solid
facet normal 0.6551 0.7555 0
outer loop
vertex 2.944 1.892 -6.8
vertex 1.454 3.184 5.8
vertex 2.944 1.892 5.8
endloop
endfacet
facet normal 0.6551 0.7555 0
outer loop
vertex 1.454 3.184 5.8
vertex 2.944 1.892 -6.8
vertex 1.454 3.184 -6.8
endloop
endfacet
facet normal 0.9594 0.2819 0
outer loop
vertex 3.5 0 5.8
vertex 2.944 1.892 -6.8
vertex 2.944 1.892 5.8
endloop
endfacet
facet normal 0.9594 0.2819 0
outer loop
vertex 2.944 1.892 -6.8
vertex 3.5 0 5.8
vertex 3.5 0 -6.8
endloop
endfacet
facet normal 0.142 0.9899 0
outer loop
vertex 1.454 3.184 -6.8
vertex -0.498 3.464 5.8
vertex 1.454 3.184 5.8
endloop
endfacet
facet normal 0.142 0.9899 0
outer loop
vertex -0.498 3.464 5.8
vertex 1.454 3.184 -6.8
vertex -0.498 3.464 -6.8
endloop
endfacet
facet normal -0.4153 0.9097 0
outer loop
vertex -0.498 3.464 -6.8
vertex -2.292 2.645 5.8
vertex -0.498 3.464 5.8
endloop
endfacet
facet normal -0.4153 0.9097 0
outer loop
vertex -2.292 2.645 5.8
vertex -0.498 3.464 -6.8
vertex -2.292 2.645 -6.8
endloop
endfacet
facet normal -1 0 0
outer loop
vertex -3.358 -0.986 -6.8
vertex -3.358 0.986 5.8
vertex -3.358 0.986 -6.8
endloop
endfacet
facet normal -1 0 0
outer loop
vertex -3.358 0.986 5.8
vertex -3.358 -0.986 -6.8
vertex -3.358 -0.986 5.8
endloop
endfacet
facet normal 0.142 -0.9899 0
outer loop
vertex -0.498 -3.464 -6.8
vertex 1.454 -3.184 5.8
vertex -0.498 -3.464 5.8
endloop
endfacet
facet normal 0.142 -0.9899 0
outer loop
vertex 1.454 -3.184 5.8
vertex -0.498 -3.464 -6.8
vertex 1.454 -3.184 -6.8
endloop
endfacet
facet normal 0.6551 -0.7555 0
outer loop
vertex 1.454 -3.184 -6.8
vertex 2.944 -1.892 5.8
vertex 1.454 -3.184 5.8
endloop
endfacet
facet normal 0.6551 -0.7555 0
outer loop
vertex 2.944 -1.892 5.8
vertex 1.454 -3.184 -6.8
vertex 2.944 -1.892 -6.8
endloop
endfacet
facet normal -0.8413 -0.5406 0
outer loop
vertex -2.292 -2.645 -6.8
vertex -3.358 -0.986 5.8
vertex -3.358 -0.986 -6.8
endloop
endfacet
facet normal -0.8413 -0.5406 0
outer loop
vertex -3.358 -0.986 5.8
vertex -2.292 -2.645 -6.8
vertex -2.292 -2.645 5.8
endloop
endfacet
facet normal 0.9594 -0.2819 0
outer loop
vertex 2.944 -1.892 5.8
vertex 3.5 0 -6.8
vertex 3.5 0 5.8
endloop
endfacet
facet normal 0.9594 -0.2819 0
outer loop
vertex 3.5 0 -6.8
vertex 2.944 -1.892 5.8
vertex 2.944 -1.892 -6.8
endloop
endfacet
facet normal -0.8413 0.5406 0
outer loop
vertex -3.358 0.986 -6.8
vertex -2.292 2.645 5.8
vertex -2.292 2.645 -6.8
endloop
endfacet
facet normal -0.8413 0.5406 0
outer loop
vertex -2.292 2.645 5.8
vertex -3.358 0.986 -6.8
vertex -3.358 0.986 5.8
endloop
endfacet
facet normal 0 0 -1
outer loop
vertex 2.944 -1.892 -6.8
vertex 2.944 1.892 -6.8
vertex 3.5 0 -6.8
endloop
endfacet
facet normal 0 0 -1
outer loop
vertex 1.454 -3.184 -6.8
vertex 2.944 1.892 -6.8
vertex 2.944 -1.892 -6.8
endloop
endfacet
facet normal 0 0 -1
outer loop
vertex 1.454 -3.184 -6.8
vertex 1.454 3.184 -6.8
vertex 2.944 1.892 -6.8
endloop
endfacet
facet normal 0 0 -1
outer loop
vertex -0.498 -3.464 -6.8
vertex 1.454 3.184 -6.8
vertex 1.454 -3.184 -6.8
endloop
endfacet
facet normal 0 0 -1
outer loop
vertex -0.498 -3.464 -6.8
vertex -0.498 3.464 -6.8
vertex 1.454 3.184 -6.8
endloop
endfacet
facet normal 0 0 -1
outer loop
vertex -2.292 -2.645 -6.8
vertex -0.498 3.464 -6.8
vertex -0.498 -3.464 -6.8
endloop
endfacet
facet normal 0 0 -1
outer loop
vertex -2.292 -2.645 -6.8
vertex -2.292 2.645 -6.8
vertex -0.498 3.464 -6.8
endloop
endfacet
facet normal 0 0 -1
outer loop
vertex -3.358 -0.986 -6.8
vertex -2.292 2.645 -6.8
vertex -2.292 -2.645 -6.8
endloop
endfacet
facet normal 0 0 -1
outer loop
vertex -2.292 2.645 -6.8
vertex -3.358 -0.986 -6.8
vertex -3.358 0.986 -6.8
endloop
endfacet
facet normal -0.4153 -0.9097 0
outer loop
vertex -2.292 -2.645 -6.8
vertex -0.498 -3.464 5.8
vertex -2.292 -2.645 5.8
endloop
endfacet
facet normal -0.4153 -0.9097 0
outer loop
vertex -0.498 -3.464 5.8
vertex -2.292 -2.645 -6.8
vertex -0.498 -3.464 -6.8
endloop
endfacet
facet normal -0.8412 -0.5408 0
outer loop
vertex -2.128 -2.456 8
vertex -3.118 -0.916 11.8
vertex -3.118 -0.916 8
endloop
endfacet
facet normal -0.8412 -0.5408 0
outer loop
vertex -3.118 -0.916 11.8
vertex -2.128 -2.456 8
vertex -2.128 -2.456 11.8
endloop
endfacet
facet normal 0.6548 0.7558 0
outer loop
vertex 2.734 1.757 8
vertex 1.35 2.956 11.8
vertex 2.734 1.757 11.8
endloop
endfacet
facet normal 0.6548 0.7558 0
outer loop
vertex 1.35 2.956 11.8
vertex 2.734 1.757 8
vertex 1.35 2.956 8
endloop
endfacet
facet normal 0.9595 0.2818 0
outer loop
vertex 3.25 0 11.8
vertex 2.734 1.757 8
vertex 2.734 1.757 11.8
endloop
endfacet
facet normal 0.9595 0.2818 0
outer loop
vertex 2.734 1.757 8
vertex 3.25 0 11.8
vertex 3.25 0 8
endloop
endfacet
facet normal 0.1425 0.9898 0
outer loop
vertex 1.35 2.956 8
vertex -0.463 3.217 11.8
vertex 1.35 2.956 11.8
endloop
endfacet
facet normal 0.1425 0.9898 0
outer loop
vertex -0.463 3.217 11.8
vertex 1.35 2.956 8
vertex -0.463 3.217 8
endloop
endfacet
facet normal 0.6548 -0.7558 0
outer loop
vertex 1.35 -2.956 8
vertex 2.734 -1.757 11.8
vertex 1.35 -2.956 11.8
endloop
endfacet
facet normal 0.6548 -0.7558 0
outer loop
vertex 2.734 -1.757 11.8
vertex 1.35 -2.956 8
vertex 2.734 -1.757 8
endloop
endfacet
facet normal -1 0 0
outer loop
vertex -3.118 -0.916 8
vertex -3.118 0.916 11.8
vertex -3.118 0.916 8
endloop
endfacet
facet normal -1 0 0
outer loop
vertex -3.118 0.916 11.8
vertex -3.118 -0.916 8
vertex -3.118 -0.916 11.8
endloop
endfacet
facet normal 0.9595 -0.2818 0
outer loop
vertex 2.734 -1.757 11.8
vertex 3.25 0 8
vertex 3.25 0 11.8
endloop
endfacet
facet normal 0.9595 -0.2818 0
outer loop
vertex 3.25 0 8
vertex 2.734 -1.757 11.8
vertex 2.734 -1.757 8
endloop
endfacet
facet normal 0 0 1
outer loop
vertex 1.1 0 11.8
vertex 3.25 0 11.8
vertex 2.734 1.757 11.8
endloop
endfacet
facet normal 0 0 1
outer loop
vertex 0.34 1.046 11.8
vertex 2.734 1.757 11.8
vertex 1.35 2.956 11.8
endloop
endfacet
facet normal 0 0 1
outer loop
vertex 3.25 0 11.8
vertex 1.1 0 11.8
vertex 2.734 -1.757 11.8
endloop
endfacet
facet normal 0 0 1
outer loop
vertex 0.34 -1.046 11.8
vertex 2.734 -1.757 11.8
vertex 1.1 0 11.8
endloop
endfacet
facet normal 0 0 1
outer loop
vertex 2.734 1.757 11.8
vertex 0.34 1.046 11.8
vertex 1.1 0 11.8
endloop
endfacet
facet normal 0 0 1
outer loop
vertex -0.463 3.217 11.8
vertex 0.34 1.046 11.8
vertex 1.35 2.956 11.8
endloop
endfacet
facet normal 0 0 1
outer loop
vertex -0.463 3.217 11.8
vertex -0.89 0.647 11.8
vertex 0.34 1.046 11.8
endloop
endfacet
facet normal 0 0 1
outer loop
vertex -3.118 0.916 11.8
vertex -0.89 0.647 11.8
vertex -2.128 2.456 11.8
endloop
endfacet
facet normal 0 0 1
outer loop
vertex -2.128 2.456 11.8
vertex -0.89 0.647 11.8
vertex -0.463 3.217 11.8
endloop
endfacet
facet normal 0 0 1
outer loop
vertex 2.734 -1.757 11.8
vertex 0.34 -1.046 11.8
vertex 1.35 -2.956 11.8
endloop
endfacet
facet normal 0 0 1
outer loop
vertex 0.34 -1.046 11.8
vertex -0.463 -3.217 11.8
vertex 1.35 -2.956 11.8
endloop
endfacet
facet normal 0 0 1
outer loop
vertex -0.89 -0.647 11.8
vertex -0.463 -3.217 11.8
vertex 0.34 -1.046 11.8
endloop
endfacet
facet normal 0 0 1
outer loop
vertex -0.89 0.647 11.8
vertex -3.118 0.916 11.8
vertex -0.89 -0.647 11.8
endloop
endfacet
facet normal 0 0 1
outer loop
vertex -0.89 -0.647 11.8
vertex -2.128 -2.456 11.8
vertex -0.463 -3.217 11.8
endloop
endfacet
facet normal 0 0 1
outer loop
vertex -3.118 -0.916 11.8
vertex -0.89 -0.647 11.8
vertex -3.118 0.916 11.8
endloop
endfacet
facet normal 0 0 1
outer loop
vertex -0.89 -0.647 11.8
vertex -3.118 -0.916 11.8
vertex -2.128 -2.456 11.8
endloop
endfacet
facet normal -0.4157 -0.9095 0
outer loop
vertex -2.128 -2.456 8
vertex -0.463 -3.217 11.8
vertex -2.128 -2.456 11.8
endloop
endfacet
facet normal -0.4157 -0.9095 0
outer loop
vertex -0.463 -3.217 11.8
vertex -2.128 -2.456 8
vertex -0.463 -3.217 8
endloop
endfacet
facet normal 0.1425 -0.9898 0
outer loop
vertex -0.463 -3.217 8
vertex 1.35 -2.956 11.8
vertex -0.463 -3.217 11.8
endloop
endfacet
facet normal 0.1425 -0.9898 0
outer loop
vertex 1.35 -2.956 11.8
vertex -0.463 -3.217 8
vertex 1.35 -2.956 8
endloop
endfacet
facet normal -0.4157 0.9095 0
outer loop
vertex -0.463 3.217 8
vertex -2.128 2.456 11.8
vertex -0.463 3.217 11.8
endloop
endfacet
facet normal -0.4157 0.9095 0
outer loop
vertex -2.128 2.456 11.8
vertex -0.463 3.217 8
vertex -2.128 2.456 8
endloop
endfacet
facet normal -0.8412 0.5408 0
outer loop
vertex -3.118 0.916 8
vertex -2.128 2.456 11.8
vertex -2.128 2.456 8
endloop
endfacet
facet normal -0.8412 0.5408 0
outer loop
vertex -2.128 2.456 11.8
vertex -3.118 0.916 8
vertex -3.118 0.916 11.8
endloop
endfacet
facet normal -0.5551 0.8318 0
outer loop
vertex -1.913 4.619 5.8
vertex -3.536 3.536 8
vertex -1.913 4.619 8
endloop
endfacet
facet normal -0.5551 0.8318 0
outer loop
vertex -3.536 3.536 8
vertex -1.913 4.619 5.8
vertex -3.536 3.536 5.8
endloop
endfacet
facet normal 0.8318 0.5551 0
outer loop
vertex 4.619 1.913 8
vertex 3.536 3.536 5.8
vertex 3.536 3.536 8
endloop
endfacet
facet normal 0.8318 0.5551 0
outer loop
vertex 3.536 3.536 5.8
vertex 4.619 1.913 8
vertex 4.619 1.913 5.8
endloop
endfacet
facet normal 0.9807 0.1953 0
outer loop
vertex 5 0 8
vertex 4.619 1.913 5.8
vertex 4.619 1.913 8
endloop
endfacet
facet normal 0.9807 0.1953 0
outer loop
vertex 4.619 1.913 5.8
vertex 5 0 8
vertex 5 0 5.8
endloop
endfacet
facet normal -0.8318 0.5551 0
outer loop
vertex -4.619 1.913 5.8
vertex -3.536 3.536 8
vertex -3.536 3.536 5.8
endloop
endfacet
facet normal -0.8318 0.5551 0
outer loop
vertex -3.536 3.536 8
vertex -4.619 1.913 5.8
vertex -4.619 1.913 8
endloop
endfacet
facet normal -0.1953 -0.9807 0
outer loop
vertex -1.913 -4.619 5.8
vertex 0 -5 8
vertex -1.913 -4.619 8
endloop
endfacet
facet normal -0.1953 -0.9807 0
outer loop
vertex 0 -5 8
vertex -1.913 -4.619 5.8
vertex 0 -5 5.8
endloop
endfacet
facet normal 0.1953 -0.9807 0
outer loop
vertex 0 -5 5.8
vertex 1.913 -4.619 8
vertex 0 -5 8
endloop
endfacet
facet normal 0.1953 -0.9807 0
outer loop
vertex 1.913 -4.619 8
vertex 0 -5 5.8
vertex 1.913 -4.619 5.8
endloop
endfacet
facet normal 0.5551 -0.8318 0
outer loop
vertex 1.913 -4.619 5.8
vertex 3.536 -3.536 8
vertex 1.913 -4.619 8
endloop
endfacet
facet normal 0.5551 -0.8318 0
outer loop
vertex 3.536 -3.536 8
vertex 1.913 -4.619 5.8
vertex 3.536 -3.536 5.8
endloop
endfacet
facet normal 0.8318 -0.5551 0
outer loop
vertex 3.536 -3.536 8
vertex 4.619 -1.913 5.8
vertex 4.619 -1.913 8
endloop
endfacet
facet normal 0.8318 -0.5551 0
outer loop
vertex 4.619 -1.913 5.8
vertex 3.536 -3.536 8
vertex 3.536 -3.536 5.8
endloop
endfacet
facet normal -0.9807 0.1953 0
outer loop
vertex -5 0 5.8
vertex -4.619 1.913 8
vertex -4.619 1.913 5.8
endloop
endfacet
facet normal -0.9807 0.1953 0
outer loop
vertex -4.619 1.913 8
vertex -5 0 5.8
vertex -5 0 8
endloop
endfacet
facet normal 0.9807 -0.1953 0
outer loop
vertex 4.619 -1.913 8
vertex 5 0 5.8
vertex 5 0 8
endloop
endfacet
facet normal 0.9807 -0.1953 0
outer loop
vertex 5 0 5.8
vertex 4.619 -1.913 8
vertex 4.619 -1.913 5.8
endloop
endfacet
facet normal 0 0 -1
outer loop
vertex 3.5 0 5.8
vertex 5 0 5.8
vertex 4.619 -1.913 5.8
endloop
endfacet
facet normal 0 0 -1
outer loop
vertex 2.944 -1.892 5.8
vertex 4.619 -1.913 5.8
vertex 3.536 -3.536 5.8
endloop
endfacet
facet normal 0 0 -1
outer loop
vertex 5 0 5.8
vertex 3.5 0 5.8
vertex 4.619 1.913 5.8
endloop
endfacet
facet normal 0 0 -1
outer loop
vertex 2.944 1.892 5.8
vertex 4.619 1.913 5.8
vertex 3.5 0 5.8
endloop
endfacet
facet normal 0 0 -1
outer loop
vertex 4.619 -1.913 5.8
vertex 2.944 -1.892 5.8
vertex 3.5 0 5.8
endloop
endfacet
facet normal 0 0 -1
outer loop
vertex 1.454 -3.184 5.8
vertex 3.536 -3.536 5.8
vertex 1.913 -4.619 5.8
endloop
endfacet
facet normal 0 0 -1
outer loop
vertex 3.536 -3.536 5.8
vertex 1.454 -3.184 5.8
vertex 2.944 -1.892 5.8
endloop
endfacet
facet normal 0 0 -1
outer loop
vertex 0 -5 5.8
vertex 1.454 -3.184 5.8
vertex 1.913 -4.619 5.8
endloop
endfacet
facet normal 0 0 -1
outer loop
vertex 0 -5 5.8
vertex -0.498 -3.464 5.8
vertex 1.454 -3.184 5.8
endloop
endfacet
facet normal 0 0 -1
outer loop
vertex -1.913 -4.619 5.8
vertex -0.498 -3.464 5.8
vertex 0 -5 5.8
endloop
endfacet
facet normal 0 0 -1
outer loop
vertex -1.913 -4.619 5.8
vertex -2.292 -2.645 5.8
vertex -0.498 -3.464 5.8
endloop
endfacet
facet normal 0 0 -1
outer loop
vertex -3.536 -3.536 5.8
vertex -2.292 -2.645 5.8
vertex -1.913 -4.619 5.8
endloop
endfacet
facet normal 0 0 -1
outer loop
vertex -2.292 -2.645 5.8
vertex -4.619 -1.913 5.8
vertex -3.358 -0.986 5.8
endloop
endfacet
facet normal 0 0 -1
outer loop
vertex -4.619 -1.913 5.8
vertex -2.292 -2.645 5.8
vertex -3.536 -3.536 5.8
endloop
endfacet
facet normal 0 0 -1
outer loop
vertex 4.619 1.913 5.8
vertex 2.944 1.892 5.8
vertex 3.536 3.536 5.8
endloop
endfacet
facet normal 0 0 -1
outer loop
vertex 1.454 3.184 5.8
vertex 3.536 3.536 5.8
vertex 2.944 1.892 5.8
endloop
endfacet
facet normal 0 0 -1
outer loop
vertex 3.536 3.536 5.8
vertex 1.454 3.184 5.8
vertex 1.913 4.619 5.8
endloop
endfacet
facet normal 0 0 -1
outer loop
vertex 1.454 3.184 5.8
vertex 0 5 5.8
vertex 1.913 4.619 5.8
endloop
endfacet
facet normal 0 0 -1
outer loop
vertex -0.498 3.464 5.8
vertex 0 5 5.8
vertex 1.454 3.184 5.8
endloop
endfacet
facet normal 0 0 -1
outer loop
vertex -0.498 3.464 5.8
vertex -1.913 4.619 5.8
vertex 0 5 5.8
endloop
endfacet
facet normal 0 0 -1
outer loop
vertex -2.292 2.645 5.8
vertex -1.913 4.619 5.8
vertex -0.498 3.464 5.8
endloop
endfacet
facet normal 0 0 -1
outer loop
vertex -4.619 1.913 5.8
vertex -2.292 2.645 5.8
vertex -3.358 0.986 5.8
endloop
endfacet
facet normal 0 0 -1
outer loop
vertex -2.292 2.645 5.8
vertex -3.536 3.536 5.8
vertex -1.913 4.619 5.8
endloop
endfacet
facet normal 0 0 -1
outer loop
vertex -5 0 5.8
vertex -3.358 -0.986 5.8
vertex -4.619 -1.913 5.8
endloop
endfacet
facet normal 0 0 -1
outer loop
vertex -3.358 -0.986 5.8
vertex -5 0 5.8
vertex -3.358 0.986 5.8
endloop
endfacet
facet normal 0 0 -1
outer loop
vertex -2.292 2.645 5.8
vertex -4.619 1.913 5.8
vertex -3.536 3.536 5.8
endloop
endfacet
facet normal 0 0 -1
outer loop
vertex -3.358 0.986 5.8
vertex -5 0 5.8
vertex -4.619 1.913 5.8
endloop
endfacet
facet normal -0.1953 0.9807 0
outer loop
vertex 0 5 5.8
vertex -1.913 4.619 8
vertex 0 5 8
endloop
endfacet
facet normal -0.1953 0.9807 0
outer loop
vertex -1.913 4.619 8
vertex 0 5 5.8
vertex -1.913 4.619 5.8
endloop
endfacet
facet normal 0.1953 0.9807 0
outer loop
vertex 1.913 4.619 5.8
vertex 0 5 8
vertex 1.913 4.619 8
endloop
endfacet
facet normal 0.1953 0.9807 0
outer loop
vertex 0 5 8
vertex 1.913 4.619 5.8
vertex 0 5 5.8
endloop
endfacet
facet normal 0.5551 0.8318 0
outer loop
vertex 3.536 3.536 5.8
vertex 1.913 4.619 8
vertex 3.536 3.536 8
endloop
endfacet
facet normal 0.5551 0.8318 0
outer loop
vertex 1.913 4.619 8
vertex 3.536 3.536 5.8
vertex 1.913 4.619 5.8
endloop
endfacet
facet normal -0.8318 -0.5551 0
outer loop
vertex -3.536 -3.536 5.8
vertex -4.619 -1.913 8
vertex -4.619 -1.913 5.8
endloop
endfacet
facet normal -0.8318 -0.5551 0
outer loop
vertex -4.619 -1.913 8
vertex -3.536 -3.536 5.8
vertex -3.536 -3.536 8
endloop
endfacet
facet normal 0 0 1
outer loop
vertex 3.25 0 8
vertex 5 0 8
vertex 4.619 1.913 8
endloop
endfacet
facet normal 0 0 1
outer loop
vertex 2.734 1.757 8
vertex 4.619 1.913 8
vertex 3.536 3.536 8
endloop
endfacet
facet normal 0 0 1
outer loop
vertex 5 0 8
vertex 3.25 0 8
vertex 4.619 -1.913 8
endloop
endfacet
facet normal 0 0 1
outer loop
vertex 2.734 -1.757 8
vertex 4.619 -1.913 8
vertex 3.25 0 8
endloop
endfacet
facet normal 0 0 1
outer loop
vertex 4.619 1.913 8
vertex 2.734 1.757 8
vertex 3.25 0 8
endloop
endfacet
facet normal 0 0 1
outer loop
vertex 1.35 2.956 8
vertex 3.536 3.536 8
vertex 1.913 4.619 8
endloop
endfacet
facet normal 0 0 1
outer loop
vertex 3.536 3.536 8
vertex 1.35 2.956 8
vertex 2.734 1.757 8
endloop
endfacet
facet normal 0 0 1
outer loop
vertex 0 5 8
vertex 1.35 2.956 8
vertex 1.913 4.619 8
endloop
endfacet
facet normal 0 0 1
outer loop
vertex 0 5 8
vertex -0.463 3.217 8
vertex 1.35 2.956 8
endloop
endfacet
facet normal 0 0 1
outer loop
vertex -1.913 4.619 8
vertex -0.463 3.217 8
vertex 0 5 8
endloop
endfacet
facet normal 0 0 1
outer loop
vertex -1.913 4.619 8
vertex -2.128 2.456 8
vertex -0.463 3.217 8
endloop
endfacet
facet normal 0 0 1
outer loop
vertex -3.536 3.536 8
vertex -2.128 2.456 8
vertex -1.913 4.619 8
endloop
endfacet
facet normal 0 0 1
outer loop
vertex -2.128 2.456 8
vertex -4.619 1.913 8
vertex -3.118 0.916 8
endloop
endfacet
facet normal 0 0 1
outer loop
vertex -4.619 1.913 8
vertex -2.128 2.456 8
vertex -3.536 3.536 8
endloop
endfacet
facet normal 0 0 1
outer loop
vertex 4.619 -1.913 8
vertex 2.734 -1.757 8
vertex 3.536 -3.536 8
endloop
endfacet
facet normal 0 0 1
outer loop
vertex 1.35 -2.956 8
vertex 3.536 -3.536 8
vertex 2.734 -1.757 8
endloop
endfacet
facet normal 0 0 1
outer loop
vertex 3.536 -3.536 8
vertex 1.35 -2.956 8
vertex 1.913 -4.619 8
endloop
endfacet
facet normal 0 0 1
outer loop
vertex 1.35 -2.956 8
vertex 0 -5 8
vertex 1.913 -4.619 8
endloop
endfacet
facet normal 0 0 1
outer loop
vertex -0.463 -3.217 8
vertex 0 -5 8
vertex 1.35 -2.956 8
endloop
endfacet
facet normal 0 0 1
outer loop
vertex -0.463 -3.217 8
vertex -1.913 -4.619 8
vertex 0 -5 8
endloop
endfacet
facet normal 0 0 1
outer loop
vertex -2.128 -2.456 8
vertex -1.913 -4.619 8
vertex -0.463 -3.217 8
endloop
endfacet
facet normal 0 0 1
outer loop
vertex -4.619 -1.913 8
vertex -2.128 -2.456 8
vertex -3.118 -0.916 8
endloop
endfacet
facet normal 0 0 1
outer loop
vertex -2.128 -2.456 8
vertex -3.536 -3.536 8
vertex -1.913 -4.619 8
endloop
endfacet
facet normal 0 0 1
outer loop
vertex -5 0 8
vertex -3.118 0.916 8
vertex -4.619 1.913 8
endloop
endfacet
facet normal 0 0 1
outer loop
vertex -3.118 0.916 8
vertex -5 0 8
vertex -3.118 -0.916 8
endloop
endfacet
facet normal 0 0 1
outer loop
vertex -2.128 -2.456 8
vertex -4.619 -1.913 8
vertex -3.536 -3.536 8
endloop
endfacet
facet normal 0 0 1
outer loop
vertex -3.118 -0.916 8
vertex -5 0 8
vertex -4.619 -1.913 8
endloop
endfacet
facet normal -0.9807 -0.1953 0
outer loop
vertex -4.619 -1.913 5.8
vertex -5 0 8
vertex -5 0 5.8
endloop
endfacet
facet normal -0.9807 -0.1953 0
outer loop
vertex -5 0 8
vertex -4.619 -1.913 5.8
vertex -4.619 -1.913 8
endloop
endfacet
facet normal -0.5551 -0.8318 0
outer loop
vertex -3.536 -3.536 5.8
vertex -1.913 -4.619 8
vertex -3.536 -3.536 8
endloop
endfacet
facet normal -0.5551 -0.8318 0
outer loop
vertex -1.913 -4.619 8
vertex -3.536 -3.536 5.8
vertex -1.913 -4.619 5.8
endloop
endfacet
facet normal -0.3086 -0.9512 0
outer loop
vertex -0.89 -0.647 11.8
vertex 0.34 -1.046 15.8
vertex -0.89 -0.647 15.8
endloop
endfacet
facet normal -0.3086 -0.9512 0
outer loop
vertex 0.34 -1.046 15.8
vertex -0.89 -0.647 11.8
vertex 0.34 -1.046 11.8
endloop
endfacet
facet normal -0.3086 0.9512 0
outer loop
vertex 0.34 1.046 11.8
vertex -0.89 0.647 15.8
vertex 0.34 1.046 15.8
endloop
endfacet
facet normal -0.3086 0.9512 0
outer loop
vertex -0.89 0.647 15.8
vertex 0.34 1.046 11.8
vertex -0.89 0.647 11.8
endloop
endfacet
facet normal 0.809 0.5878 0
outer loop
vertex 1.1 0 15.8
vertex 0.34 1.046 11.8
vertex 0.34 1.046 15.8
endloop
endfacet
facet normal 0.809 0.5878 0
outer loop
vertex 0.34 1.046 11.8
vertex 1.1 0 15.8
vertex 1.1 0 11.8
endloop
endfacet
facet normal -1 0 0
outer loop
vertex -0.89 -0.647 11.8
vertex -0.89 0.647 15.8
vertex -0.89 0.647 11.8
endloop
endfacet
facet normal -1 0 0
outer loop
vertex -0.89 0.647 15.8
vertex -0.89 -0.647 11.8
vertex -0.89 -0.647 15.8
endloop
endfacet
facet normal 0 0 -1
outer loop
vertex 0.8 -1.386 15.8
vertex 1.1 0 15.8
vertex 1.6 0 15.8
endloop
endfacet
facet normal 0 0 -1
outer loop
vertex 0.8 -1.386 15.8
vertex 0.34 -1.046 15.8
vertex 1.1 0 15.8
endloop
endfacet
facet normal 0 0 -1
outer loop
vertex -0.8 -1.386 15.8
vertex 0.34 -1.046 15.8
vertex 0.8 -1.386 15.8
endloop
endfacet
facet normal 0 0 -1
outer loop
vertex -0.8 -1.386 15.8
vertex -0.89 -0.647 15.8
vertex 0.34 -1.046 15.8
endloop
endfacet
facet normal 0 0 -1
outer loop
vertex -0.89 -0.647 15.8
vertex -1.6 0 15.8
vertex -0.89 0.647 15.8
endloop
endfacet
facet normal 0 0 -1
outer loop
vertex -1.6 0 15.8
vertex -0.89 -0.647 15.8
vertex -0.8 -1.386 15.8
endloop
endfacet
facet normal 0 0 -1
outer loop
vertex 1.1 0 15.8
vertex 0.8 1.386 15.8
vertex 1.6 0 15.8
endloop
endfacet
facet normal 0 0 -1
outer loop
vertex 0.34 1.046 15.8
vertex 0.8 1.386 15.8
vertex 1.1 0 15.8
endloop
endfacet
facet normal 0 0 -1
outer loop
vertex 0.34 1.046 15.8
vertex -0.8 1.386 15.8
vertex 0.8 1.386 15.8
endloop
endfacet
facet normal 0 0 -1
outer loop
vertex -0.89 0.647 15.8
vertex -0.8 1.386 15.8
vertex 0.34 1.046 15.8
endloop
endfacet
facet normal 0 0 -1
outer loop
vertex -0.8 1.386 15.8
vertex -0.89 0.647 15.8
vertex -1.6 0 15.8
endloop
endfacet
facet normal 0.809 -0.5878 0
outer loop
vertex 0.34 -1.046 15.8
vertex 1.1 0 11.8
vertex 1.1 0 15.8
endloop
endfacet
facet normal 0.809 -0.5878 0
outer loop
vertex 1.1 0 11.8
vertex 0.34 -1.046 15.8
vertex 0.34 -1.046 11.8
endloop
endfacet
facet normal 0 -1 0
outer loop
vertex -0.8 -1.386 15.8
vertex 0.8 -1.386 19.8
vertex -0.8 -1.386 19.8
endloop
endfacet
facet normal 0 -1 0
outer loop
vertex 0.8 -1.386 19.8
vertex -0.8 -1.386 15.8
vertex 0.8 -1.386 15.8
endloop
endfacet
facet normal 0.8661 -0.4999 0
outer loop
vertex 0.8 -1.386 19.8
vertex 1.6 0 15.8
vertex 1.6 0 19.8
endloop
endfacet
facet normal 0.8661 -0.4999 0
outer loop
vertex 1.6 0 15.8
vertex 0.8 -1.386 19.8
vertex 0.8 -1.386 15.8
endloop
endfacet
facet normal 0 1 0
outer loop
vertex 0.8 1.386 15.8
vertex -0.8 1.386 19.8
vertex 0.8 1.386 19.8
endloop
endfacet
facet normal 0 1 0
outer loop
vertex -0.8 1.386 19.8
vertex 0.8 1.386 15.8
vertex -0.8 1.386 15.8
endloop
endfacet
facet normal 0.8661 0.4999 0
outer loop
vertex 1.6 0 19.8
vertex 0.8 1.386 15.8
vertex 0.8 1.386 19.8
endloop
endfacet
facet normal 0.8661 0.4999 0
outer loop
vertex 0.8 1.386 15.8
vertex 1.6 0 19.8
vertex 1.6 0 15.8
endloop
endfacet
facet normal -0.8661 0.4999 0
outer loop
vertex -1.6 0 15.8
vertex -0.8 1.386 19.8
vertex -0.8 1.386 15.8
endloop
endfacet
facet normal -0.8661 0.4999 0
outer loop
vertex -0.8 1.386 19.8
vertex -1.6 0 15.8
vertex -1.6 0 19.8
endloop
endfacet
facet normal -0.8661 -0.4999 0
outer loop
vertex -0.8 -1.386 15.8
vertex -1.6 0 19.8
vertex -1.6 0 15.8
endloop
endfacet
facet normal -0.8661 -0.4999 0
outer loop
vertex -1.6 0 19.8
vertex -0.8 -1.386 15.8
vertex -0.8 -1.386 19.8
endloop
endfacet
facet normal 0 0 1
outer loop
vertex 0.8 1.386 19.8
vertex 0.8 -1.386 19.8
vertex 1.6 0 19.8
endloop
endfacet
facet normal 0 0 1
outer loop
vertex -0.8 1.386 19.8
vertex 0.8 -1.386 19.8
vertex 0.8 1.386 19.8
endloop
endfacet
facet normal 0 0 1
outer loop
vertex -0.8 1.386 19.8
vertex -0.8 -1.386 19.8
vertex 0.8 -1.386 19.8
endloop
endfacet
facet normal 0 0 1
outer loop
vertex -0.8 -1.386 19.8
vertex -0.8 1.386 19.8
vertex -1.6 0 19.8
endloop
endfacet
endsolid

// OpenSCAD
// Parameters
body_diameter_mm = 7; //[3.5:14:0.1]
overall_height_mm = 13.6; //[6.8:27.2:0.1]
body_height_mm = 13.6; //[6.8:27.2:0.1]
lever_length_mm = 10; //[5:20:0.1]
lever_diameter_mm = 2.2; //[1:5:0.1]
thread_outer_diameter_mm = 6.5; //[3.25:13:0.1]
thread_length_mm = 6; //[3:12:0.1]
panel_thickness_mm = 3; //[1:8:0.1]
mounting_hardware_included = 1; //[0:1:1]
overlap_mm = 1; //[0.5:2:0.1]
toggle_tip_diameter_mm = 3.2; //[1.6:6.4:0.1]
toggle_tip_height_mm = 4; //[2:8:0.1]
nut_seat_outer_diameter_mm = 10; //[5:20:0.1]
nut_seat_height_mm = 2.2; //[1:5:0.1]

// Toggle switch - complete geometry
module toggle() {
  union() {
    // Cylindrical body
    color("DimGray") {
      translate([0, 0, 0])
        cylinder(r=body_diameter_mm/2, h=body_height_mm, center=true);
    }
    
    // Panel mount thread or collar
    color("Silver") {
      translate([0, 0, body_height_mm/2 + thread_length_mm/2 - overlap_mm])
        cylinder(r=thread_outer_diameter_mm/2, h=thread_length_mm, center=true);
    }
    
    // Mounting nut and washer seat
    if (mounting_hardware_included) {
      color("Silver") {
        translate([0, 0, body_height_mm/2 + nut_seat_height_mm/2 - overlap_mm])
          cylinder(r=nut_seat_outer_diameter_mm/2, h=nut_seat_height_mm, center=true);
      }
    }
    
    // Actuator lever
    color("Black") {
      translate([0, 0, body_height_mm/2 + lever_length_mm/2 - overlap_mm])
        cylinder(r=lever_diameter_mm/2, h=lever_length_mm, center=true);
    }
    
    // Toggle tip
    color("Black") {
      translate([0, 0, body_height_mm/2 + lever_length_mm - overlap_mm + toggle_tip_height_mm/2])
        cylinder(r=toggle_tip_diameter_mm/2, h=toggle_tip_height_mm, center=true);
    }
  }
}

// Assembly
module assembly() {
  toggle();
}

assembly();
